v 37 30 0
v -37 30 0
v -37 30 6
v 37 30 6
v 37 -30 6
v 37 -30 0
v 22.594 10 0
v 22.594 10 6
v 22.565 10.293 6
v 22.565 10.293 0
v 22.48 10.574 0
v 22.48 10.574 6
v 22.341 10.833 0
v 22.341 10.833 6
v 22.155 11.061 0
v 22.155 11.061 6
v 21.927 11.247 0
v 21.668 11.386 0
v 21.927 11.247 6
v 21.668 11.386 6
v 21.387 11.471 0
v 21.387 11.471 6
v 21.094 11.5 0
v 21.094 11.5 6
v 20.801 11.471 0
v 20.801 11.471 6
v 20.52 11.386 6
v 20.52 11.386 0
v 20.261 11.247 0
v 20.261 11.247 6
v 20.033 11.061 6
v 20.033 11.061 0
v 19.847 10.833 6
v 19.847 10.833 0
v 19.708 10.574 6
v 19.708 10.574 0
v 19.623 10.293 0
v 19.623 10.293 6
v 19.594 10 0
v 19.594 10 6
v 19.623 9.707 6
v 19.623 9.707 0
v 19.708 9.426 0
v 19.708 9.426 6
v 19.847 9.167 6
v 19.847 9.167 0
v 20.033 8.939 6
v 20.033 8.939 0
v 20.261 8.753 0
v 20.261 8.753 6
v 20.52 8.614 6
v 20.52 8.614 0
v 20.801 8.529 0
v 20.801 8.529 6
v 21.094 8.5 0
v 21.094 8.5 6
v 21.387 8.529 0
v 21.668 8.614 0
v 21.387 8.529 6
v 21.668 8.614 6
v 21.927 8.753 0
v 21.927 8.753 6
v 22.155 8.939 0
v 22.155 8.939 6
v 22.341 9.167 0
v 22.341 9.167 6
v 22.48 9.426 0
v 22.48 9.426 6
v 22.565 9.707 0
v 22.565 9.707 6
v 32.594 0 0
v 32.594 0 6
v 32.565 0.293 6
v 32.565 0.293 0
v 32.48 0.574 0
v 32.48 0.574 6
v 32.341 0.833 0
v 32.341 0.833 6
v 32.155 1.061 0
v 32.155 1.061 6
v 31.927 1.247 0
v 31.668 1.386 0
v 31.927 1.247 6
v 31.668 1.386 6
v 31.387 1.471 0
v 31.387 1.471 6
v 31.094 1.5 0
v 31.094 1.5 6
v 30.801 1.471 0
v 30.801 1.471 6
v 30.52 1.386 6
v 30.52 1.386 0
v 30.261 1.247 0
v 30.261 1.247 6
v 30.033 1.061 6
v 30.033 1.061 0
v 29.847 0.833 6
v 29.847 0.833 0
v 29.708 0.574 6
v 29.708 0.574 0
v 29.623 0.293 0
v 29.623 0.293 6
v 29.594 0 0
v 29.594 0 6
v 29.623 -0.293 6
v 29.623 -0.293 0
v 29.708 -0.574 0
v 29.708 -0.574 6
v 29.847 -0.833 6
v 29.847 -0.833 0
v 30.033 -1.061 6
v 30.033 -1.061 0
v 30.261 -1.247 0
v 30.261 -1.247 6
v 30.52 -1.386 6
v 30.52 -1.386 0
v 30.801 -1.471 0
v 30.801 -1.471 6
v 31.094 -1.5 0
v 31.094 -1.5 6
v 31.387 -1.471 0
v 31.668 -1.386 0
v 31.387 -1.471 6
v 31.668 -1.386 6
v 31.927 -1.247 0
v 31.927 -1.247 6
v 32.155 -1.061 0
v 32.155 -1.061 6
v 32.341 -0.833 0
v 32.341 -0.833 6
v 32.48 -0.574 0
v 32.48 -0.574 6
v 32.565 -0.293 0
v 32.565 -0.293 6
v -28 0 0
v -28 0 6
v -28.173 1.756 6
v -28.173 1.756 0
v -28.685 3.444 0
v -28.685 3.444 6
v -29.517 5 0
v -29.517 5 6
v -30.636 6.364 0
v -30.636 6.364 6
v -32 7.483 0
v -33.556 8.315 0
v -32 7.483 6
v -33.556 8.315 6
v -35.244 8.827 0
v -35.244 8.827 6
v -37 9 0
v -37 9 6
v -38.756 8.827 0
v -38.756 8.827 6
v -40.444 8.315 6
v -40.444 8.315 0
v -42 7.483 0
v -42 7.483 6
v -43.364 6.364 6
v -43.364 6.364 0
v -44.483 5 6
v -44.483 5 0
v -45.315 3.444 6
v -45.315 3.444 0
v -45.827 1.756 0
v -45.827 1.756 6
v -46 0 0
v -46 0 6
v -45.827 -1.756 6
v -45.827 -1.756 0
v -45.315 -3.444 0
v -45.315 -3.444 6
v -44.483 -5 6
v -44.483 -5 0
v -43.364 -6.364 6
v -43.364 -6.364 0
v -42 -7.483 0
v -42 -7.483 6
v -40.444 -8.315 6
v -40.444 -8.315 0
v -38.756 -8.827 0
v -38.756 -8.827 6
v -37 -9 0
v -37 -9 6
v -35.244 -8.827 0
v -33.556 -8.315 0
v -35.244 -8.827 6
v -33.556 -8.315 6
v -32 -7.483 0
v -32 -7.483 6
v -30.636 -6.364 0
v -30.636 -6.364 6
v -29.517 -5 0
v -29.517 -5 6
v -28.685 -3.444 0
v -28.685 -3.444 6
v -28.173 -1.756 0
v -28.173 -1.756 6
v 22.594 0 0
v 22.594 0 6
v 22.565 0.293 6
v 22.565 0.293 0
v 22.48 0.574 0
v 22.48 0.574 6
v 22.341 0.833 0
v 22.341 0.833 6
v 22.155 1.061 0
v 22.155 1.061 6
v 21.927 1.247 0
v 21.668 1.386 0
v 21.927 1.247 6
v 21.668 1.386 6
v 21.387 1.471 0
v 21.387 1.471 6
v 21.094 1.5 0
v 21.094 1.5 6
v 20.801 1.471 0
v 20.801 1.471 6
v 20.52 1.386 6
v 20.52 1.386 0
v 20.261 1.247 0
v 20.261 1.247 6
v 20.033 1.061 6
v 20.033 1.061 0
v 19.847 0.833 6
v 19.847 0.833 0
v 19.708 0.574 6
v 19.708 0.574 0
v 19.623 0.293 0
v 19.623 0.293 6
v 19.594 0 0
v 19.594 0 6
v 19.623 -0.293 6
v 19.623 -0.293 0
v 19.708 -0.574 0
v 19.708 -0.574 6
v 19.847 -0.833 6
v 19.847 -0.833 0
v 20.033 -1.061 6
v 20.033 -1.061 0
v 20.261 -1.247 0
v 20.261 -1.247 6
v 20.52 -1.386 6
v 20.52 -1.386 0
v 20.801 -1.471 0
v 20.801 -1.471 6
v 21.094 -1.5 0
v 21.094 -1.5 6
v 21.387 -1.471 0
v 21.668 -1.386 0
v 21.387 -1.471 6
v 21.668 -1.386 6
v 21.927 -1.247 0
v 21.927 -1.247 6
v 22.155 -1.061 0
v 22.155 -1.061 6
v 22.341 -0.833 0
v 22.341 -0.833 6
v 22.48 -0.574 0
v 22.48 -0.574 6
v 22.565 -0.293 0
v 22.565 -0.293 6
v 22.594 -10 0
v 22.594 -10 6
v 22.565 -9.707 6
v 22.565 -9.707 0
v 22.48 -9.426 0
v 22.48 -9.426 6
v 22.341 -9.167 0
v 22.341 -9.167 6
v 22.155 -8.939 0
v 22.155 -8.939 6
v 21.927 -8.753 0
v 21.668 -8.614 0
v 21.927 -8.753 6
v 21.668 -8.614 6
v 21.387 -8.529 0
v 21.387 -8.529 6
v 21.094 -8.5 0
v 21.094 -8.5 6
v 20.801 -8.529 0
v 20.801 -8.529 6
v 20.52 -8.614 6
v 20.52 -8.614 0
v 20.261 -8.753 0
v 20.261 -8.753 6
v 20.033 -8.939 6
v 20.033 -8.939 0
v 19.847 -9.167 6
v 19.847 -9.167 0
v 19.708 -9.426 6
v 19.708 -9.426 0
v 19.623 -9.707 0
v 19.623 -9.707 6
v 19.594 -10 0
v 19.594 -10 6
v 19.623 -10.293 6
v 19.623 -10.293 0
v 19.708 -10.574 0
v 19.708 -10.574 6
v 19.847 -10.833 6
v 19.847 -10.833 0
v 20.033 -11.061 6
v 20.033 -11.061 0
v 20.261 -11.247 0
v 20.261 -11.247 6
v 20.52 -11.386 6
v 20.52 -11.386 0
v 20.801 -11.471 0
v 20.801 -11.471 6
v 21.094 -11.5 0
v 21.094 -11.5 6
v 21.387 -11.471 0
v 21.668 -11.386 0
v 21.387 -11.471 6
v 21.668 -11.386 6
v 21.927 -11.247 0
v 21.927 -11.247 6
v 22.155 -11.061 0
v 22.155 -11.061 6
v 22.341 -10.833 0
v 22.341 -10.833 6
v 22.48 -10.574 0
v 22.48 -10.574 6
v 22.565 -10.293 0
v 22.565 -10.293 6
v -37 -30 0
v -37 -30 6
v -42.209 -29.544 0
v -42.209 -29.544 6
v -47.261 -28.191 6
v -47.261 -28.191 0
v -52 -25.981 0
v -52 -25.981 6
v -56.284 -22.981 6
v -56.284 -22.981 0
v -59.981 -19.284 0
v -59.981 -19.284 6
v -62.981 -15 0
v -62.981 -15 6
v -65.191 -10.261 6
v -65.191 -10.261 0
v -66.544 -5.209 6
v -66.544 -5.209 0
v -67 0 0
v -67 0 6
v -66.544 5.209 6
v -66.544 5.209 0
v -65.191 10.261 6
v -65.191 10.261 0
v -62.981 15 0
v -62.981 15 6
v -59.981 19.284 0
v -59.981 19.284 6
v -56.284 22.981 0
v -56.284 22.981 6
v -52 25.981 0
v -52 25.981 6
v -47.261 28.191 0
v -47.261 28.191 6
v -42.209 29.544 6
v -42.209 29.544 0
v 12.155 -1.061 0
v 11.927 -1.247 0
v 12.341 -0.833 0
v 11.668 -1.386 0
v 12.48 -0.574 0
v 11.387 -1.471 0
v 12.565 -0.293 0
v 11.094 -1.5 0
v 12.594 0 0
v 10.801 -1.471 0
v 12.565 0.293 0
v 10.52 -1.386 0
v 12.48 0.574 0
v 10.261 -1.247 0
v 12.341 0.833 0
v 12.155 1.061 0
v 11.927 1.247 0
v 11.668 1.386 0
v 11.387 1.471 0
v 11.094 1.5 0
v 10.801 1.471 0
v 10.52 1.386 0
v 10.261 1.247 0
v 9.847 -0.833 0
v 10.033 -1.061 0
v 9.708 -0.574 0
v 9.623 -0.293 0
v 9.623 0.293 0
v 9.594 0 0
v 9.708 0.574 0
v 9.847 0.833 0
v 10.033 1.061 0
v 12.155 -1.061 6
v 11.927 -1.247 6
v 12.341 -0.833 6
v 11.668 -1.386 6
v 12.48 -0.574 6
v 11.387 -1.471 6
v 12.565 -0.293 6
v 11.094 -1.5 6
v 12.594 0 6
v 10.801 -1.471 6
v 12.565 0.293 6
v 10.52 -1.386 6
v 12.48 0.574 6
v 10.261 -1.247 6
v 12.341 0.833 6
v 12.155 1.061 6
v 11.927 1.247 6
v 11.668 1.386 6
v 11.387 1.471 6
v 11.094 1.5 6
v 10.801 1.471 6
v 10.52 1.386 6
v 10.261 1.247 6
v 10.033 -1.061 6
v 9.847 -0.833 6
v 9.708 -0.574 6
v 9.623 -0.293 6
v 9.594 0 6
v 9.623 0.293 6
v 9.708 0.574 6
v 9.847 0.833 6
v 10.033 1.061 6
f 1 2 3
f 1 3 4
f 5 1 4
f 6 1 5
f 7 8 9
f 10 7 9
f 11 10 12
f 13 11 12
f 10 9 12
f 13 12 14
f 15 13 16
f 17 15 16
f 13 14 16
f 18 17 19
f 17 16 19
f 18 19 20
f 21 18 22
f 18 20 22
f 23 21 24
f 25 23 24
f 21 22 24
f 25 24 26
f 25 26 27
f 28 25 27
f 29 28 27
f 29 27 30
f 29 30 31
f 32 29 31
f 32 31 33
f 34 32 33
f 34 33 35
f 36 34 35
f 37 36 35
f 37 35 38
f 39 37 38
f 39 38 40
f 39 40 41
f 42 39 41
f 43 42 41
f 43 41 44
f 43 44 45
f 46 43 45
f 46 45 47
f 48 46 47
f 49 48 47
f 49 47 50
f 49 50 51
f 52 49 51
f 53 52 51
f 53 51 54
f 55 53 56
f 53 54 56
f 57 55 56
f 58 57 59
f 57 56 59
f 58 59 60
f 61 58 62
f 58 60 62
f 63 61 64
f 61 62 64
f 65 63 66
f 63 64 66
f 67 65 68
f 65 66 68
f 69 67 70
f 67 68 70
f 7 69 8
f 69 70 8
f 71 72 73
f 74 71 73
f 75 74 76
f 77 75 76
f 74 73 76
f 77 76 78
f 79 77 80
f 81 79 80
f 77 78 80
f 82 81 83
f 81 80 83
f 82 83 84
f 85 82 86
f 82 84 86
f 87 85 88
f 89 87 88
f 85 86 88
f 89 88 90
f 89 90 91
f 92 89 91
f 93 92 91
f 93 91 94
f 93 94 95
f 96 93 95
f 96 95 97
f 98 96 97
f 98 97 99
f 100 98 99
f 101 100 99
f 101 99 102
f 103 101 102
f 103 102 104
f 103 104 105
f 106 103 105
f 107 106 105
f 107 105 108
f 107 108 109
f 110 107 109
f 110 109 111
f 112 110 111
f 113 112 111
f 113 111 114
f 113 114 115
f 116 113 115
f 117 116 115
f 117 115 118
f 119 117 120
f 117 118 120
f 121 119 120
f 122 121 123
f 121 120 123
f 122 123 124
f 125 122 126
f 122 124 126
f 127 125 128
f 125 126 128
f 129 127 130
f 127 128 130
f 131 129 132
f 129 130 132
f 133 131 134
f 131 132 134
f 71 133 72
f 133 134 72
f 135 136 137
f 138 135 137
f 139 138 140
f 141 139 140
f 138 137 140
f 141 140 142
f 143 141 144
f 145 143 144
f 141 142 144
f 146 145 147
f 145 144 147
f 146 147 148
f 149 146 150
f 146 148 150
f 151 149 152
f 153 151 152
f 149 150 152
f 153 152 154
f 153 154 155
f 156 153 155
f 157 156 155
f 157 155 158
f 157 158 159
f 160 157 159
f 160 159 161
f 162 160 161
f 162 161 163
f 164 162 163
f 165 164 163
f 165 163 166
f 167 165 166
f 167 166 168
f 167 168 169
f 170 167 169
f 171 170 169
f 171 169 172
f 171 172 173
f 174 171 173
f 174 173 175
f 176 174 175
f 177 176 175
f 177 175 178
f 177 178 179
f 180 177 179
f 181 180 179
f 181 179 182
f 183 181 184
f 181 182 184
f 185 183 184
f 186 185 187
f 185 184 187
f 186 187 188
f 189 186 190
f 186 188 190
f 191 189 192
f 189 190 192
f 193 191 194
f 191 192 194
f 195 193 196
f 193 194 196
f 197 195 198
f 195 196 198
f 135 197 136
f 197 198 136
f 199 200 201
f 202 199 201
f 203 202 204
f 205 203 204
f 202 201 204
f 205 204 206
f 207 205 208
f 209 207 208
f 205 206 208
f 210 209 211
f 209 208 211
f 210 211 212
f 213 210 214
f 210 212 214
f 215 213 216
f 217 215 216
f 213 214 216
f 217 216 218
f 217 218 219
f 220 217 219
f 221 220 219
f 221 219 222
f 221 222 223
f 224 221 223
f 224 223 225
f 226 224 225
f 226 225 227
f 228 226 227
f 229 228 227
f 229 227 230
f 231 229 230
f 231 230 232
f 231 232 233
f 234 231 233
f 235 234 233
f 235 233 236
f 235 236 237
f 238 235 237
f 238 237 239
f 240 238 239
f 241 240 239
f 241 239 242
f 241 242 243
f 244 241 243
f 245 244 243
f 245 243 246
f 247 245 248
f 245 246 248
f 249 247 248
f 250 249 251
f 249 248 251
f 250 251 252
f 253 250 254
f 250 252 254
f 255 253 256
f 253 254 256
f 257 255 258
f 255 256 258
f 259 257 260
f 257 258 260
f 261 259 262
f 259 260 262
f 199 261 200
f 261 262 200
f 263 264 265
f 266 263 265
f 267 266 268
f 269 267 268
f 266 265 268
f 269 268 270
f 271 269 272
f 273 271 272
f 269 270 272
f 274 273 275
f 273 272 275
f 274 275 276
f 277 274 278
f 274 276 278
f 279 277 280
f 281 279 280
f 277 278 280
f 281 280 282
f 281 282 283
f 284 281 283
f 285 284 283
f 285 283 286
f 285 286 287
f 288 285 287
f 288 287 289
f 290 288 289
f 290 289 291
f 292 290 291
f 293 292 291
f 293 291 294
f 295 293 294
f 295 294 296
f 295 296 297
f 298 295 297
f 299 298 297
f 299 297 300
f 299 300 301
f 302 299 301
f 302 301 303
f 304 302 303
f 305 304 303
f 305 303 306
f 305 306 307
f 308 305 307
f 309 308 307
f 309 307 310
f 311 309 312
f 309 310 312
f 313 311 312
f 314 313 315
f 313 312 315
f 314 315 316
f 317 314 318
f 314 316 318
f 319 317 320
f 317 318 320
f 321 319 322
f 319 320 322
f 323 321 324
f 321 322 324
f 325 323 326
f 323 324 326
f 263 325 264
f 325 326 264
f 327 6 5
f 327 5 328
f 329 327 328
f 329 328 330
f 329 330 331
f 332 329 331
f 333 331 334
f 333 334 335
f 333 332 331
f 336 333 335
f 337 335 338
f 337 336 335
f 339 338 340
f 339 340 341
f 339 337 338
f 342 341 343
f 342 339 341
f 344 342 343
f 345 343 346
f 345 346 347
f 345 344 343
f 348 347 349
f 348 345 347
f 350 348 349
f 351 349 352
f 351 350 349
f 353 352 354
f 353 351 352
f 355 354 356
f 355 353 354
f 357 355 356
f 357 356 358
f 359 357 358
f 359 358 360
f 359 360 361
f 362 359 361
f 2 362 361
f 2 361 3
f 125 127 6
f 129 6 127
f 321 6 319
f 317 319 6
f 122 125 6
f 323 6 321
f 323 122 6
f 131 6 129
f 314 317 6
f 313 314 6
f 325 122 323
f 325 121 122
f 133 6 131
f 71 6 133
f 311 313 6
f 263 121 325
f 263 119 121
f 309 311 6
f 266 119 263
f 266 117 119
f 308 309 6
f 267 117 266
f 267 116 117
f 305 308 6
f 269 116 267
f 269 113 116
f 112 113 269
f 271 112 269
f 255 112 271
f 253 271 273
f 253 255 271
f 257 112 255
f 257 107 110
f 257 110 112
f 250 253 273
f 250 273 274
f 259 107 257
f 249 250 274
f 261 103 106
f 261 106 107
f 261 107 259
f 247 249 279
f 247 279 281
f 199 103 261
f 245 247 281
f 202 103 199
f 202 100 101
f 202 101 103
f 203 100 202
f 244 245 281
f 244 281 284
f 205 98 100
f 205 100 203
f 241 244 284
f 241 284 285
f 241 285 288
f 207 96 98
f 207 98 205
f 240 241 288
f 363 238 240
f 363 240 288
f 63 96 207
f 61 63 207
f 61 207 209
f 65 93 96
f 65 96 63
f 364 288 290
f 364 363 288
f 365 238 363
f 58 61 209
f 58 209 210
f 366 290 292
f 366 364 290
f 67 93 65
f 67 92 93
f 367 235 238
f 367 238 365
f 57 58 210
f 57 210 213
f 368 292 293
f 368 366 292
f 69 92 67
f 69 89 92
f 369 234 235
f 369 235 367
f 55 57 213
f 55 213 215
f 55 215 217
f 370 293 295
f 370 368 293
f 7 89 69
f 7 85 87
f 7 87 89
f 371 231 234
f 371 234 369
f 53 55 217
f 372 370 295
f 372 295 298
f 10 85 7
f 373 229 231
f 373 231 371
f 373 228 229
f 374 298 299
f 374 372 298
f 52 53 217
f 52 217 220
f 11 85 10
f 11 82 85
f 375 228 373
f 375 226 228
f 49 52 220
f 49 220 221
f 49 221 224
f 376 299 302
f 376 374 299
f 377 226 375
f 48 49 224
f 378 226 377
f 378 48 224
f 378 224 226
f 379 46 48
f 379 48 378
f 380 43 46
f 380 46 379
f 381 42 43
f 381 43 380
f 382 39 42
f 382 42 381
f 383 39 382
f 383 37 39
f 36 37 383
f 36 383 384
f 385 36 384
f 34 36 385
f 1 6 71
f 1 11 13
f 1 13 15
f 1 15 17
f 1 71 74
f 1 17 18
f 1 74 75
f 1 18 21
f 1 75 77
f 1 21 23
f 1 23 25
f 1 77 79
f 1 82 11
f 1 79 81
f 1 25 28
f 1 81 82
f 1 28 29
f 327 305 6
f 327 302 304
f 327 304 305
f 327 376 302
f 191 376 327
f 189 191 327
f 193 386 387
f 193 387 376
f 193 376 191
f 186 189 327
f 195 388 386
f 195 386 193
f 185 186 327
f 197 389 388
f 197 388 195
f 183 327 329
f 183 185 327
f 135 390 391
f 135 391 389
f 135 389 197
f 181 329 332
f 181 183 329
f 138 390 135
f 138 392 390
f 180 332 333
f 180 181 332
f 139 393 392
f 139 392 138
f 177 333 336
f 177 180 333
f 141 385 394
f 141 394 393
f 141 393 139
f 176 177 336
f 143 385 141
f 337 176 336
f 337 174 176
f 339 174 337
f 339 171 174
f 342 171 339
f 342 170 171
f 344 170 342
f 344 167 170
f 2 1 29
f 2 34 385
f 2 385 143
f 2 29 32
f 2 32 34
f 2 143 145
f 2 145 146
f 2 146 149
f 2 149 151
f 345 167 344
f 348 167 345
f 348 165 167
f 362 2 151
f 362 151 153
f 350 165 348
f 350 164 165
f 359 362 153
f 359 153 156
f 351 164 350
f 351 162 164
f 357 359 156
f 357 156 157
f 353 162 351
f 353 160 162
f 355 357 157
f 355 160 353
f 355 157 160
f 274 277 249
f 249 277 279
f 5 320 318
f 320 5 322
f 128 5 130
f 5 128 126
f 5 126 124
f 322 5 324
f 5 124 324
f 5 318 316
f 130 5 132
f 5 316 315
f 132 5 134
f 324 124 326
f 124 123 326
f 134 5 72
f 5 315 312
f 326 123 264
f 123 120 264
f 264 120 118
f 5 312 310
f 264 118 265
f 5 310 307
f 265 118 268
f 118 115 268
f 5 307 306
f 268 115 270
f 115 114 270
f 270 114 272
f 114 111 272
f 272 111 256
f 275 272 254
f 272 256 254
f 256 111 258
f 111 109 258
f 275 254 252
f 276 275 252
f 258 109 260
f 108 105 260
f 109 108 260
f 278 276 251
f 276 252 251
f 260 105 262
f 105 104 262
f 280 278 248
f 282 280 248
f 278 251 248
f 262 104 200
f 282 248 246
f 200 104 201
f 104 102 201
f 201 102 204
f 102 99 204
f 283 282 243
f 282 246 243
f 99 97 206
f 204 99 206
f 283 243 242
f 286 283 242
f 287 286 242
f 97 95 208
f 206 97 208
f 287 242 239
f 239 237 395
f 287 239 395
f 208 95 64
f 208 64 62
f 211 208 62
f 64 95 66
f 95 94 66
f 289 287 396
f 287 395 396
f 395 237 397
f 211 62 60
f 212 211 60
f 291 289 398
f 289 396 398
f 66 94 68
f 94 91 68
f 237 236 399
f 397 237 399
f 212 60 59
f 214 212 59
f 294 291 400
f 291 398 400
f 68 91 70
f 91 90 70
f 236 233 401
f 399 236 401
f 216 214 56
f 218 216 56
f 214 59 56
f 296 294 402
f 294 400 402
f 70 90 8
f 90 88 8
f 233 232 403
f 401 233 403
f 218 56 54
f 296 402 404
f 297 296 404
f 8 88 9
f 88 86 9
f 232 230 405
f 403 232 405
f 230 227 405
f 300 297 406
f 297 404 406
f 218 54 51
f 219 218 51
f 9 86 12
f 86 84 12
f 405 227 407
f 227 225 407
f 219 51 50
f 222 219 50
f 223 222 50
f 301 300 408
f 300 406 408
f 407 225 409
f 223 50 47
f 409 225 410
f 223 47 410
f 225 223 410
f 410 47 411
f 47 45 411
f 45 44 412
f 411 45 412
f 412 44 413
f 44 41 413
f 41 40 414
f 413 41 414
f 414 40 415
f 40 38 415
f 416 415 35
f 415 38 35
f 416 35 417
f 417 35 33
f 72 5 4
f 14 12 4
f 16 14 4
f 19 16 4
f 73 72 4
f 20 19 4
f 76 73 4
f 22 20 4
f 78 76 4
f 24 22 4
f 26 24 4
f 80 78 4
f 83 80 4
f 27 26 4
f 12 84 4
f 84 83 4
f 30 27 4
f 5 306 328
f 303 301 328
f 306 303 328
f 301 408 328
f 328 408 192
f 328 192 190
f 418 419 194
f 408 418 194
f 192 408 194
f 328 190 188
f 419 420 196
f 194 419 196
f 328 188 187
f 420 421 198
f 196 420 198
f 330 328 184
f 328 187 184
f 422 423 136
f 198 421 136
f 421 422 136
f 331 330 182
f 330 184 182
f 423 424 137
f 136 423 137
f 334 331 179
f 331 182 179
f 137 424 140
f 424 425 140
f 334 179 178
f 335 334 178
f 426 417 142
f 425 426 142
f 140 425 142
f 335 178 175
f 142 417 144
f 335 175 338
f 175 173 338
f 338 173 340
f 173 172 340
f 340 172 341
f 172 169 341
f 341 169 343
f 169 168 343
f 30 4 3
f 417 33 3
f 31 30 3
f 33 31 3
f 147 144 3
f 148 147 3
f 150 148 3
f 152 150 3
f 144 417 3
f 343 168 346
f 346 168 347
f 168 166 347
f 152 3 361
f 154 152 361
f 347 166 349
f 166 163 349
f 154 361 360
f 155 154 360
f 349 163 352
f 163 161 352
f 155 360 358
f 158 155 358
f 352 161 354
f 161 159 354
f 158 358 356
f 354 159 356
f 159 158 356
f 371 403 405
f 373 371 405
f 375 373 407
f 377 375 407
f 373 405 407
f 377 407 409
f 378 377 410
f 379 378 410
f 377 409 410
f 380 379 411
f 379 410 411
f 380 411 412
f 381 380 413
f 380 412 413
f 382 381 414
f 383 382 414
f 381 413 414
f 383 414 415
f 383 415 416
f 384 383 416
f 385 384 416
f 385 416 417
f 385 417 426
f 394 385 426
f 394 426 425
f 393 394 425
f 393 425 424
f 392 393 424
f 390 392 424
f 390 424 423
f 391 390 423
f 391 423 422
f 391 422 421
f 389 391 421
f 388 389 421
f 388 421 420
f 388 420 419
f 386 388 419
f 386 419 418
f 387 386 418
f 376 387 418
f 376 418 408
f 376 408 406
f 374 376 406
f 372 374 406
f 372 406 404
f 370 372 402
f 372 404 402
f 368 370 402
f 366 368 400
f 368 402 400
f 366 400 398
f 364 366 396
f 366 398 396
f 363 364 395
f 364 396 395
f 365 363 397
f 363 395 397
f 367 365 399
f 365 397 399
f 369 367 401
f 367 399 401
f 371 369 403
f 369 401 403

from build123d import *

# Parameters (mm, degrees)
SALIENTE_EXTRUIR1_DEPTH = 6
CROQUIS2_R              = 1.5
CORTAR_EXTRUIR1_DEPTH   = 74.654599313
CROQUIS3_R              = 9
CORTAR_EXTRUIR2_DEPTH   = 74.654599313


with BuildPart() as part:
    # Croquis1 → Saliente-Extruir1 (new body)
    with BuildSketch(Plane.XY):
        with BuildLine():
            Line((-37, 30), (37, 30))
            Line((37, 30), (37, -30))
            Line((37, -30), (-37, -30))
            ThreePointArc((-37, -30), (-67, 0), (-37, 30))
        make_face()
    extrude(amount=SALIENTE_EXTRUIR1_DEPTH)

    # Croquis2 → Cortar-Extruir1 (cut, through all)
    with BuildSketch(Plane.XY.offset(6)):
        with Locations((21.0941, -10)):
            Circle(CROQUIS2_R)
        with Locations((21.0941, 0)):
            Circle(CROQUIS2_R)
        with Locations((21.0941, 10)):
            Circle(CROQUIS2_R)
        with Locations((31.0941, 0)):
            Circle(CROQUIS2_R)
        with Locations((11.0941, 0)):
            Circle(CROQUIS2_R)
    extrude(amount=-CORTAR_EXTRUIR1_DEPTH, mode=Mode.SUBTRACT)

    # Croquis3 → Cortar-Extruir2 (cut, through all)
    with BuildSketch(Plane.XY.offset(6)):
        with Locations((-37, 0)):
            Circle(CROQUIS3_R)
    extrude(amount=-CORTAR_EXTRUIR2_DEPTH, mode=Mode.SUBTRACT)


solid = part.part
